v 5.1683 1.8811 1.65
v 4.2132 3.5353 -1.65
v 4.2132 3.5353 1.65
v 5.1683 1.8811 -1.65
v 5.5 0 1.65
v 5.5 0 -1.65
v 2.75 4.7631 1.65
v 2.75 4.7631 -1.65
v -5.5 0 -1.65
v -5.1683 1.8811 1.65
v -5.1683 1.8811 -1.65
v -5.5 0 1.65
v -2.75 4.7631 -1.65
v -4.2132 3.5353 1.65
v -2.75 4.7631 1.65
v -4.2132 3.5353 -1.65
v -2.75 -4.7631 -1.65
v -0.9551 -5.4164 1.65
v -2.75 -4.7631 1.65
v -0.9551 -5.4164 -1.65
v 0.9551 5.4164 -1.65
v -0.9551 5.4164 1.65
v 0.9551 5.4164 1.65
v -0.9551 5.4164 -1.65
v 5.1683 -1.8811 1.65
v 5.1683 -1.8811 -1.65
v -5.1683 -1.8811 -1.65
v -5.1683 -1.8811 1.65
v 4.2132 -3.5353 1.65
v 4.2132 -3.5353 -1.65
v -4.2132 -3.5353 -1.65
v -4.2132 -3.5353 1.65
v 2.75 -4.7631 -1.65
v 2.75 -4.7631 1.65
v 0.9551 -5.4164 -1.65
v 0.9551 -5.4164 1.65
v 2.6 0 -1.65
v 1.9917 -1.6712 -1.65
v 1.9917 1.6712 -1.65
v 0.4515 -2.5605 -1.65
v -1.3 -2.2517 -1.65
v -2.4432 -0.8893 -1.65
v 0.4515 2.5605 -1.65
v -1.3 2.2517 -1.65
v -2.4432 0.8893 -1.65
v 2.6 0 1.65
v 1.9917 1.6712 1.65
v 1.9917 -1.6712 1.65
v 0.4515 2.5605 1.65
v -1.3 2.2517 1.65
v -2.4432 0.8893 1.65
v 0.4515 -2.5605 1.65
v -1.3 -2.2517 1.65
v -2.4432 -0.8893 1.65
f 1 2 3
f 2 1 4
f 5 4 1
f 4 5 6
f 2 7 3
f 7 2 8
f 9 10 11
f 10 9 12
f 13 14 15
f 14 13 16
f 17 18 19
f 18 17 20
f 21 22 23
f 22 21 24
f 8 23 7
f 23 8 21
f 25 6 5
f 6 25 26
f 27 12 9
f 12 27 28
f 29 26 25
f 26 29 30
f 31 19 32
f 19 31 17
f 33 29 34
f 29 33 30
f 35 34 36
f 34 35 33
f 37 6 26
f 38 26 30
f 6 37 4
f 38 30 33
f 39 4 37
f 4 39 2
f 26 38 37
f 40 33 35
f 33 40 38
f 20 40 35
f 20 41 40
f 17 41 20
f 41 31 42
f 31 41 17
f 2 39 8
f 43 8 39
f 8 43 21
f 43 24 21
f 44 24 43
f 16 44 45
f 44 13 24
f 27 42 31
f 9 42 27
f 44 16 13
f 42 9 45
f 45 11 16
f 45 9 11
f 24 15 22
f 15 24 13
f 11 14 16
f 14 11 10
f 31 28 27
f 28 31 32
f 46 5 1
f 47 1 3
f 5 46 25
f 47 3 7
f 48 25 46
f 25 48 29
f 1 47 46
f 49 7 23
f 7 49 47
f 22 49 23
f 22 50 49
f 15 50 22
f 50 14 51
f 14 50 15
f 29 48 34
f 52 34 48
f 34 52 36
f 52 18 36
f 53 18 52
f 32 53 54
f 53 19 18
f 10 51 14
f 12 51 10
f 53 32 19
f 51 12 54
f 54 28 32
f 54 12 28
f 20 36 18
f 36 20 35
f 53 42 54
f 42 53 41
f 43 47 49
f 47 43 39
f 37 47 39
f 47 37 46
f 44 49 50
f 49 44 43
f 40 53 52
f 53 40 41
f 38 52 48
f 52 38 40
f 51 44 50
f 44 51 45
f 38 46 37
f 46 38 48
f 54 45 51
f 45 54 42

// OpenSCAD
difference(){
cylinder(h = 3.3, r = 5.5, center = true);
cylinder(h = 3.3, r = 2.6, center = true);
}
